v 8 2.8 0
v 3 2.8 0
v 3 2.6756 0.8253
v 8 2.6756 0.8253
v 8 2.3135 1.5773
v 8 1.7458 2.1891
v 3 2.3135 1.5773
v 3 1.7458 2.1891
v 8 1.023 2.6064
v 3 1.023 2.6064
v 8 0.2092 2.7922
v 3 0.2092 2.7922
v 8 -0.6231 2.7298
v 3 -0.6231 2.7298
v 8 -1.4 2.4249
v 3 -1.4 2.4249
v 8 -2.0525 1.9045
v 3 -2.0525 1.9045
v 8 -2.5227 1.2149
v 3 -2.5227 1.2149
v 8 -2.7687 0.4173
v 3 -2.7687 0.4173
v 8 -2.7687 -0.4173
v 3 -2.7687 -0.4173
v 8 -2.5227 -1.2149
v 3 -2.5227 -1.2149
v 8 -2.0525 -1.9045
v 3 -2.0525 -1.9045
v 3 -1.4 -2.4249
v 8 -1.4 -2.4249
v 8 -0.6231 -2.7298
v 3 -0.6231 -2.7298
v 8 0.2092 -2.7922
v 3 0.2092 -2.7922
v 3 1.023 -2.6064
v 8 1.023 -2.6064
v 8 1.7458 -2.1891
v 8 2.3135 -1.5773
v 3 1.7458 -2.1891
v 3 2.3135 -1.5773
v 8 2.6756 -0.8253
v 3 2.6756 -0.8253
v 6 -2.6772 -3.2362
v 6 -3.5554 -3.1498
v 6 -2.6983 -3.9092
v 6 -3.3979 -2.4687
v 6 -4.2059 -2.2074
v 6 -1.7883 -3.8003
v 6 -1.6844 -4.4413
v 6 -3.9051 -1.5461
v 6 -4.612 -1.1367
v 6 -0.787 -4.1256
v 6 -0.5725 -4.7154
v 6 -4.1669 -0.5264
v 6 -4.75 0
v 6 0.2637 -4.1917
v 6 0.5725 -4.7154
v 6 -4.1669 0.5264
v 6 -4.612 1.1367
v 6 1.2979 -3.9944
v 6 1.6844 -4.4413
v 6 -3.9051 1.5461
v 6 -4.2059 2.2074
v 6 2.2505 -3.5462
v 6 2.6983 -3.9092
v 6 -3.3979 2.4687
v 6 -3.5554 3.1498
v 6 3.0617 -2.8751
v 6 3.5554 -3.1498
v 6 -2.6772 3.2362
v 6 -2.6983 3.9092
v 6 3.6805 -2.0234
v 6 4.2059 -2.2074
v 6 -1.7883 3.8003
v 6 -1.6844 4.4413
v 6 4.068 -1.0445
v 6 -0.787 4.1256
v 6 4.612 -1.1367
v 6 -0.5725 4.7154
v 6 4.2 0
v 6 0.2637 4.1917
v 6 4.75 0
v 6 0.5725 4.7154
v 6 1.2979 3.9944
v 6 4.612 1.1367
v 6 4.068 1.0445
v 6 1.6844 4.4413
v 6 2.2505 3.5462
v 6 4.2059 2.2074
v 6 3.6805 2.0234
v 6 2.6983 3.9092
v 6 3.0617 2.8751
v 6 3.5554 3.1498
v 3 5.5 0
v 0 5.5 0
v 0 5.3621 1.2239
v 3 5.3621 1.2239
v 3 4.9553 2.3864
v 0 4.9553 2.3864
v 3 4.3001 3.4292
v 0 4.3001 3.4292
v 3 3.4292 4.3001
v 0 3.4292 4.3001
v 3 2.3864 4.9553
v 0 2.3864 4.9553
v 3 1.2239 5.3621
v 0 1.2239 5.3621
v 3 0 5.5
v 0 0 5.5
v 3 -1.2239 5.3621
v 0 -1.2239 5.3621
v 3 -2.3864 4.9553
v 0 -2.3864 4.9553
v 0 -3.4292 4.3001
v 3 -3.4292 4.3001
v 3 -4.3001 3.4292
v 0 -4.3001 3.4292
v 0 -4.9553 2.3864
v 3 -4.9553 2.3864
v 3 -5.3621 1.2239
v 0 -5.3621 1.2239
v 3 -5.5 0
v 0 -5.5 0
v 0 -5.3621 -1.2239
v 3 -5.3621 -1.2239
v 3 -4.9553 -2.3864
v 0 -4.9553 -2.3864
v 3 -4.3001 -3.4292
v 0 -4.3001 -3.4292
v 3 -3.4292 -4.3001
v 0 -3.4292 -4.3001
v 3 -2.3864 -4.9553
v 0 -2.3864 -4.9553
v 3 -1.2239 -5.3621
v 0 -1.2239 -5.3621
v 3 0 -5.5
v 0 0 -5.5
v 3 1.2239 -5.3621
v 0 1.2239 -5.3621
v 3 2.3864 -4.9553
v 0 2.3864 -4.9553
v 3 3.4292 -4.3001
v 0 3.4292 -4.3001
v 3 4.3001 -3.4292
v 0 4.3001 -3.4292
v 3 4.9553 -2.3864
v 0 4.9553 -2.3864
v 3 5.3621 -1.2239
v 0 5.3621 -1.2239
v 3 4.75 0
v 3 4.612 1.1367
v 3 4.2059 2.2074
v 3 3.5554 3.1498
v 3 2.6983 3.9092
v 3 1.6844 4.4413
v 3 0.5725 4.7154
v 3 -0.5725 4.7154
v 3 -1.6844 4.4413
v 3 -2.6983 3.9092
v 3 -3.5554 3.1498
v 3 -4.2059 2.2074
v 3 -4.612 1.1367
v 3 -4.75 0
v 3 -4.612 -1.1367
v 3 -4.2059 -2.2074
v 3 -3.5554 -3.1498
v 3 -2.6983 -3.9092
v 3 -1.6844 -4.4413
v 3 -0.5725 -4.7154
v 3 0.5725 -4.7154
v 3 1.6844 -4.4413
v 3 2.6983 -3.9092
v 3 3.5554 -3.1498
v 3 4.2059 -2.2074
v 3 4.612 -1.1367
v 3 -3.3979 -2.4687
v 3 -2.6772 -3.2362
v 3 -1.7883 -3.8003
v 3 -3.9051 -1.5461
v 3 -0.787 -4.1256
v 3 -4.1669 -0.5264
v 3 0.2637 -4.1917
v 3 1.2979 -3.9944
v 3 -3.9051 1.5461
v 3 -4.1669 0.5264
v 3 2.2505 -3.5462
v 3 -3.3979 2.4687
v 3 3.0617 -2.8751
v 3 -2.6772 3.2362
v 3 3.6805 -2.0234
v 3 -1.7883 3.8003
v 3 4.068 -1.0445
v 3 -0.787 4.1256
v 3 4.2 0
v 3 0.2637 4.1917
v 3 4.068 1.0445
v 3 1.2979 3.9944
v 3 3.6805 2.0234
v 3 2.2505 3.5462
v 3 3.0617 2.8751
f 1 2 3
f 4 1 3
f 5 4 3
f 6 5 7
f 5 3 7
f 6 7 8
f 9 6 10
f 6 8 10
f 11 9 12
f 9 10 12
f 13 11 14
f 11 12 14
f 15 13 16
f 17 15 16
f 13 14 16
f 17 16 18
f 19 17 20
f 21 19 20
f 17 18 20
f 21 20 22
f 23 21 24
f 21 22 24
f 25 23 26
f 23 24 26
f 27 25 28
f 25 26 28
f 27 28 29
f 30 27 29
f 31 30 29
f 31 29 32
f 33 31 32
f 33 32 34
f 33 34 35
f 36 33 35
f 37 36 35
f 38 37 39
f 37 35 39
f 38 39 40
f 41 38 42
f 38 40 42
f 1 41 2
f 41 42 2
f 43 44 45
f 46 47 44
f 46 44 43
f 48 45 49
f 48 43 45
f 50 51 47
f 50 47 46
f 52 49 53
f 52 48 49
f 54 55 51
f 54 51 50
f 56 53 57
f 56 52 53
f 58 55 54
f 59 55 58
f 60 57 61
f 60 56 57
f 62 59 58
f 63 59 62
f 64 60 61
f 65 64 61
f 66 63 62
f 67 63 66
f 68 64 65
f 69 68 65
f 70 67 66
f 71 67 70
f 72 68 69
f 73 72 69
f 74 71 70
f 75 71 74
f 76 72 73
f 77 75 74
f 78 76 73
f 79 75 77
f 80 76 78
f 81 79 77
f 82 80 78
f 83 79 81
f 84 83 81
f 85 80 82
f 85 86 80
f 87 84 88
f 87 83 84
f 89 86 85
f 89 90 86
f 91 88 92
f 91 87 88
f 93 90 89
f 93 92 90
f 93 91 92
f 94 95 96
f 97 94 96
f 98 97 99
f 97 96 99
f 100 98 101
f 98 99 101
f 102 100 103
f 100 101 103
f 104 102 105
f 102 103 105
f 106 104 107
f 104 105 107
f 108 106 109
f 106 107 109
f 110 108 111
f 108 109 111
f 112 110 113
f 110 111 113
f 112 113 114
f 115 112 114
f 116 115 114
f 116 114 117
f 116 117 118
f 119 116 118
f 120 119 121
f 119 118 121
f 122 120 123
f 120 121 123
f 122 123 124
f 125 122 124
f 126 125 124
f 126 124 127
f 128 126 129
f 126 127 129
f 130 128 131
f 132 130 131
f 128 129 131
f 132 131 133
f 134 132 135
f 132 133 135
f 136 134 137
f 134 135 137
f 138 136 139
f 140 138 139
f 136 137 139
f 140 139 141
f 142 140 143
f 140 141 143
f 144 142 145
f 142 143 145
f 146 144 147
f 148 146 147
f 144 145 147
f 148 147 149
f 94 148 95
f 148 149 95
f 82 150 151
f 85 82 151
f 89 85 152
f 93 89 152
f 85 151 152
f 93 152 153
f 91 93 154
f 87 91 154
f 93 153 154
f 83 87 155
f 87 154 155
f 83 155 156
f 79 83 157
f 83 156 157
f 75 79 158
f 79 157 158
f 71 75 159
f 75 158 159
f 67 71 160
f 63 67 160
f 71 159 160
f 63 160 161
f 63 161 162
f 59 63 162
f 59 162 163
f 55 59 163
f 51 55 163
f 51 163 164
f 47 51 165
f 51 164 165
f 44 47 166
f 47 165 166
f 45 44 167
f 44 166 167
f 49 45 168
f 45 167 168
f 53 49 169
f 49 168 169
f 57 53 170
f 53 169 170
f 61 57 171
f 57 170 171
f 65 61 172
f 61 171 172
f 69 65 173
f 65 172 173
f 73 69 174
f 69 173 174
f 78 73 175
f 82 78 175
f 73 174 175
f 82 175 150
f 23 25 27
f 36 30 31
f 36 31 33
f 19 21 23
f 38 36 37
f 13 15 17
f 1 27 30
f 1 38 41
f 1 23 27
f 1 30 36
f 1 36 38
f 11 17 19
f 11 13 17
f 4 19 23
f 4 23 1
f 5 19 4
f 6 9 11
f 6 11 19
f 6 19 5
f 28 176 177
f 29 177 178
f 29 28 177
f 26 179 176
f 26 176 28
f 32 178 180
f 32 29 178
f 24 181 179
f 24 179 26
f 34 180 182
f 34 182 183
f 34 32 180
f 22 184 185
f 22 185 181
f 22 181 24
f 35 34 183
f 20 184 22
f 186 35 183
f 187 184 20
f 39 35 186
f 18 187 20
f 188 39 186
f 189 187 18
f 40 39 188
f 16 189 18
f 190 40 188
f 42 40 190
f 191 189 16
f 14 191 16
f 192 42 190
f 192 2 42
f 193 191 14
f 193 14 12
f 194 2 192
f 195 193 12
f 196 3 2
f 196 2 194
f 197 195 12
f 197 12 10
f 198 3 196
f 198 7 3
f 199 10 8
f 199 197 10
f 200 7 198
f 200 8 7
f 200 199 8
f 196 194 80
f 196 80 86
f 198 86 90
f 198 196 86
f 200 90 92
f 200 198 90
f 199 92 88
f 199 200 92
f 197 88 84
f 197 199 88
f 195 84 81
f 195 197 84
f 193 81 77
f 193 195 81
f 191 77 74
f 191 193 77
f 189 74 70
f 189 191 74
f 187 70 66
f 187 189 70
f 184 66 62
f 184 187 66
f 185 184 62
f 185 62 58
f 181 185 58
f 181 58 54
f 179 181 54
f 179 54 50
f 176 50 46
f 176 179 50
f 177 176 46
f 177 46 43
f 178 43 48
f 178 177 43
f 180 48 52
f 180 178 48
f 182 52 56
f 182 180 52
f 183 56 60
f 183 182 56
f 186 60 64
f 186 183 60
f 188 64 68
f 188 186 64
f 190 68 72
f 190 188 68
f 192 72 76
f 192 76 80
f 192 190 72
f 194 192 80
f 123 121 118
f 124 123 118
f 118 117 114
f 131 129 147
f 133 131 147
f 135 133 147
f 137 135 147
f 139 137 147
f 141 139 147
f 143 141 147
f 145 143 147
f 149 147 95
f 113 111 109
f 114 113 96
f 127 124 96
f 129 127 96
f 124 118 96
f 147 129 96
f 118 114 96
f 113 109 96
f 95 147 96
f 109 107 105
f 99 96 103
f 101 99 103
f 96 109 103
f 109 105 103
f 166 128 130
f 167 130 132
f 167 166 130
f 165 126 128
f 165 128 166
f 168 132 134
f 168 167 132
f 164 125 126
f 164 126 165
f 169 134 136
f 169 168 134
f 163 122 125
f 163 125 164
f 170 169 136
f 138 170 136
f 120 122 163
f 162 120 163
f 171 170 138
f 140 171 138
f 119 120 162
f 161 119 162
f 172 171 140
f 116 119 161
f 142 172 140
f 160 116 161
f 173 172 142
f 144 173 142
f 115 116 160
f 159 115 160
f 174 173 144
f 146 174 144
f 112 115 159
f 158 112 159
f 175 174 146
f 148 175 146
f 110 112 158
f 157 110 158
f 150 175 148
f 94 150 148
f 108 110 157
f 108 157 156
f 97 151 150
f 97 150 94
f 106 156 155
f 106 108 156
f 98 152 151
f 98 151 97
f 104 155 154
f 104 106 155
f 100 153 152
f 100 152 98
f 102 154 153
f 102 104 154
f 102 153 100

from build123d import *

# Parameters (mm, degrees)
F0_R     = 5.5
F1_DEPTH = 3
F2_R     = 2.8
F3_DEPTH = 5
F2_R_2   = 4.75
F2_R_3   = 4.2
F4_DEPTH = 3


with BuildPart() as f1:
    # F0 (on Right) → F1 (new body)
    with BuildSketch(Plane.YZ):
        Circle(F0_R)
    extrude(amount=F1_DEPTH)

    # F2 (on face) → F3 (join)
    with BuildSketch(Plane.YZ.offset(3)):
        Circle(F2_R)
    extrude(amount=F3_DEPTH)

    # F2 (on face) → F4 (join)
    with BuildSketch(Plane.YZ.offset(3)):
        Circle(F2_R_2)
        Circle(F2_R_3, mode=Mode.SUBTRACT)
    extrude(amount=F4_DEPTH)


solid = f1.part
